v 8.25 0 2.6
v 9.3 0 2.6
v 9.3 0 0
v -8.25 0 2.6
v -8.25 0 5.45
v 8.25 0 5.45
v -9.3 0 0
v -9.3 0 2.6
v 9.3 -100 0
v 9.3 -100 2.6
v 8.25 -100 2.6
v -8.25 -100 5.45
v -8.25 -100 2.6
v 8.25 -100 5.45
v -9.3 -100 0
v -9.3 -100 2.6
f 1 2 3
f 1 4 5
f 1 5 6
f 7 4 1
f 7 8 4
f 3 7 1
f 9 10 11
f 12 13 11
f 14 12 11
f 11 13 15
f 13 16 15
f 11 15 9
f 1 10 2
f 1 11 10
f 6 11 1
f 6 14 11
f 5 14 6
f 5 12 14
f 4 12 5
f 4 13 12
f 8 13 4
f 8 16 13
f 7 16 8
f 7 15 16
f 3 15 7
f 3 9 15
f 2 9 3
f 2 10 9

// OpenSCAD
runner();

module runner(length = 100) {
    color("lime") {
        rotate([90,0,0])
        translate([0,1.3,0]) {
            linear_extrude(height = length)
            union() {
            square([18.6, 2.6], center = true);
            translate([0, 2.6, 0])
                square([16.5, 3.1], center = true);
            }
        }
    }
}
